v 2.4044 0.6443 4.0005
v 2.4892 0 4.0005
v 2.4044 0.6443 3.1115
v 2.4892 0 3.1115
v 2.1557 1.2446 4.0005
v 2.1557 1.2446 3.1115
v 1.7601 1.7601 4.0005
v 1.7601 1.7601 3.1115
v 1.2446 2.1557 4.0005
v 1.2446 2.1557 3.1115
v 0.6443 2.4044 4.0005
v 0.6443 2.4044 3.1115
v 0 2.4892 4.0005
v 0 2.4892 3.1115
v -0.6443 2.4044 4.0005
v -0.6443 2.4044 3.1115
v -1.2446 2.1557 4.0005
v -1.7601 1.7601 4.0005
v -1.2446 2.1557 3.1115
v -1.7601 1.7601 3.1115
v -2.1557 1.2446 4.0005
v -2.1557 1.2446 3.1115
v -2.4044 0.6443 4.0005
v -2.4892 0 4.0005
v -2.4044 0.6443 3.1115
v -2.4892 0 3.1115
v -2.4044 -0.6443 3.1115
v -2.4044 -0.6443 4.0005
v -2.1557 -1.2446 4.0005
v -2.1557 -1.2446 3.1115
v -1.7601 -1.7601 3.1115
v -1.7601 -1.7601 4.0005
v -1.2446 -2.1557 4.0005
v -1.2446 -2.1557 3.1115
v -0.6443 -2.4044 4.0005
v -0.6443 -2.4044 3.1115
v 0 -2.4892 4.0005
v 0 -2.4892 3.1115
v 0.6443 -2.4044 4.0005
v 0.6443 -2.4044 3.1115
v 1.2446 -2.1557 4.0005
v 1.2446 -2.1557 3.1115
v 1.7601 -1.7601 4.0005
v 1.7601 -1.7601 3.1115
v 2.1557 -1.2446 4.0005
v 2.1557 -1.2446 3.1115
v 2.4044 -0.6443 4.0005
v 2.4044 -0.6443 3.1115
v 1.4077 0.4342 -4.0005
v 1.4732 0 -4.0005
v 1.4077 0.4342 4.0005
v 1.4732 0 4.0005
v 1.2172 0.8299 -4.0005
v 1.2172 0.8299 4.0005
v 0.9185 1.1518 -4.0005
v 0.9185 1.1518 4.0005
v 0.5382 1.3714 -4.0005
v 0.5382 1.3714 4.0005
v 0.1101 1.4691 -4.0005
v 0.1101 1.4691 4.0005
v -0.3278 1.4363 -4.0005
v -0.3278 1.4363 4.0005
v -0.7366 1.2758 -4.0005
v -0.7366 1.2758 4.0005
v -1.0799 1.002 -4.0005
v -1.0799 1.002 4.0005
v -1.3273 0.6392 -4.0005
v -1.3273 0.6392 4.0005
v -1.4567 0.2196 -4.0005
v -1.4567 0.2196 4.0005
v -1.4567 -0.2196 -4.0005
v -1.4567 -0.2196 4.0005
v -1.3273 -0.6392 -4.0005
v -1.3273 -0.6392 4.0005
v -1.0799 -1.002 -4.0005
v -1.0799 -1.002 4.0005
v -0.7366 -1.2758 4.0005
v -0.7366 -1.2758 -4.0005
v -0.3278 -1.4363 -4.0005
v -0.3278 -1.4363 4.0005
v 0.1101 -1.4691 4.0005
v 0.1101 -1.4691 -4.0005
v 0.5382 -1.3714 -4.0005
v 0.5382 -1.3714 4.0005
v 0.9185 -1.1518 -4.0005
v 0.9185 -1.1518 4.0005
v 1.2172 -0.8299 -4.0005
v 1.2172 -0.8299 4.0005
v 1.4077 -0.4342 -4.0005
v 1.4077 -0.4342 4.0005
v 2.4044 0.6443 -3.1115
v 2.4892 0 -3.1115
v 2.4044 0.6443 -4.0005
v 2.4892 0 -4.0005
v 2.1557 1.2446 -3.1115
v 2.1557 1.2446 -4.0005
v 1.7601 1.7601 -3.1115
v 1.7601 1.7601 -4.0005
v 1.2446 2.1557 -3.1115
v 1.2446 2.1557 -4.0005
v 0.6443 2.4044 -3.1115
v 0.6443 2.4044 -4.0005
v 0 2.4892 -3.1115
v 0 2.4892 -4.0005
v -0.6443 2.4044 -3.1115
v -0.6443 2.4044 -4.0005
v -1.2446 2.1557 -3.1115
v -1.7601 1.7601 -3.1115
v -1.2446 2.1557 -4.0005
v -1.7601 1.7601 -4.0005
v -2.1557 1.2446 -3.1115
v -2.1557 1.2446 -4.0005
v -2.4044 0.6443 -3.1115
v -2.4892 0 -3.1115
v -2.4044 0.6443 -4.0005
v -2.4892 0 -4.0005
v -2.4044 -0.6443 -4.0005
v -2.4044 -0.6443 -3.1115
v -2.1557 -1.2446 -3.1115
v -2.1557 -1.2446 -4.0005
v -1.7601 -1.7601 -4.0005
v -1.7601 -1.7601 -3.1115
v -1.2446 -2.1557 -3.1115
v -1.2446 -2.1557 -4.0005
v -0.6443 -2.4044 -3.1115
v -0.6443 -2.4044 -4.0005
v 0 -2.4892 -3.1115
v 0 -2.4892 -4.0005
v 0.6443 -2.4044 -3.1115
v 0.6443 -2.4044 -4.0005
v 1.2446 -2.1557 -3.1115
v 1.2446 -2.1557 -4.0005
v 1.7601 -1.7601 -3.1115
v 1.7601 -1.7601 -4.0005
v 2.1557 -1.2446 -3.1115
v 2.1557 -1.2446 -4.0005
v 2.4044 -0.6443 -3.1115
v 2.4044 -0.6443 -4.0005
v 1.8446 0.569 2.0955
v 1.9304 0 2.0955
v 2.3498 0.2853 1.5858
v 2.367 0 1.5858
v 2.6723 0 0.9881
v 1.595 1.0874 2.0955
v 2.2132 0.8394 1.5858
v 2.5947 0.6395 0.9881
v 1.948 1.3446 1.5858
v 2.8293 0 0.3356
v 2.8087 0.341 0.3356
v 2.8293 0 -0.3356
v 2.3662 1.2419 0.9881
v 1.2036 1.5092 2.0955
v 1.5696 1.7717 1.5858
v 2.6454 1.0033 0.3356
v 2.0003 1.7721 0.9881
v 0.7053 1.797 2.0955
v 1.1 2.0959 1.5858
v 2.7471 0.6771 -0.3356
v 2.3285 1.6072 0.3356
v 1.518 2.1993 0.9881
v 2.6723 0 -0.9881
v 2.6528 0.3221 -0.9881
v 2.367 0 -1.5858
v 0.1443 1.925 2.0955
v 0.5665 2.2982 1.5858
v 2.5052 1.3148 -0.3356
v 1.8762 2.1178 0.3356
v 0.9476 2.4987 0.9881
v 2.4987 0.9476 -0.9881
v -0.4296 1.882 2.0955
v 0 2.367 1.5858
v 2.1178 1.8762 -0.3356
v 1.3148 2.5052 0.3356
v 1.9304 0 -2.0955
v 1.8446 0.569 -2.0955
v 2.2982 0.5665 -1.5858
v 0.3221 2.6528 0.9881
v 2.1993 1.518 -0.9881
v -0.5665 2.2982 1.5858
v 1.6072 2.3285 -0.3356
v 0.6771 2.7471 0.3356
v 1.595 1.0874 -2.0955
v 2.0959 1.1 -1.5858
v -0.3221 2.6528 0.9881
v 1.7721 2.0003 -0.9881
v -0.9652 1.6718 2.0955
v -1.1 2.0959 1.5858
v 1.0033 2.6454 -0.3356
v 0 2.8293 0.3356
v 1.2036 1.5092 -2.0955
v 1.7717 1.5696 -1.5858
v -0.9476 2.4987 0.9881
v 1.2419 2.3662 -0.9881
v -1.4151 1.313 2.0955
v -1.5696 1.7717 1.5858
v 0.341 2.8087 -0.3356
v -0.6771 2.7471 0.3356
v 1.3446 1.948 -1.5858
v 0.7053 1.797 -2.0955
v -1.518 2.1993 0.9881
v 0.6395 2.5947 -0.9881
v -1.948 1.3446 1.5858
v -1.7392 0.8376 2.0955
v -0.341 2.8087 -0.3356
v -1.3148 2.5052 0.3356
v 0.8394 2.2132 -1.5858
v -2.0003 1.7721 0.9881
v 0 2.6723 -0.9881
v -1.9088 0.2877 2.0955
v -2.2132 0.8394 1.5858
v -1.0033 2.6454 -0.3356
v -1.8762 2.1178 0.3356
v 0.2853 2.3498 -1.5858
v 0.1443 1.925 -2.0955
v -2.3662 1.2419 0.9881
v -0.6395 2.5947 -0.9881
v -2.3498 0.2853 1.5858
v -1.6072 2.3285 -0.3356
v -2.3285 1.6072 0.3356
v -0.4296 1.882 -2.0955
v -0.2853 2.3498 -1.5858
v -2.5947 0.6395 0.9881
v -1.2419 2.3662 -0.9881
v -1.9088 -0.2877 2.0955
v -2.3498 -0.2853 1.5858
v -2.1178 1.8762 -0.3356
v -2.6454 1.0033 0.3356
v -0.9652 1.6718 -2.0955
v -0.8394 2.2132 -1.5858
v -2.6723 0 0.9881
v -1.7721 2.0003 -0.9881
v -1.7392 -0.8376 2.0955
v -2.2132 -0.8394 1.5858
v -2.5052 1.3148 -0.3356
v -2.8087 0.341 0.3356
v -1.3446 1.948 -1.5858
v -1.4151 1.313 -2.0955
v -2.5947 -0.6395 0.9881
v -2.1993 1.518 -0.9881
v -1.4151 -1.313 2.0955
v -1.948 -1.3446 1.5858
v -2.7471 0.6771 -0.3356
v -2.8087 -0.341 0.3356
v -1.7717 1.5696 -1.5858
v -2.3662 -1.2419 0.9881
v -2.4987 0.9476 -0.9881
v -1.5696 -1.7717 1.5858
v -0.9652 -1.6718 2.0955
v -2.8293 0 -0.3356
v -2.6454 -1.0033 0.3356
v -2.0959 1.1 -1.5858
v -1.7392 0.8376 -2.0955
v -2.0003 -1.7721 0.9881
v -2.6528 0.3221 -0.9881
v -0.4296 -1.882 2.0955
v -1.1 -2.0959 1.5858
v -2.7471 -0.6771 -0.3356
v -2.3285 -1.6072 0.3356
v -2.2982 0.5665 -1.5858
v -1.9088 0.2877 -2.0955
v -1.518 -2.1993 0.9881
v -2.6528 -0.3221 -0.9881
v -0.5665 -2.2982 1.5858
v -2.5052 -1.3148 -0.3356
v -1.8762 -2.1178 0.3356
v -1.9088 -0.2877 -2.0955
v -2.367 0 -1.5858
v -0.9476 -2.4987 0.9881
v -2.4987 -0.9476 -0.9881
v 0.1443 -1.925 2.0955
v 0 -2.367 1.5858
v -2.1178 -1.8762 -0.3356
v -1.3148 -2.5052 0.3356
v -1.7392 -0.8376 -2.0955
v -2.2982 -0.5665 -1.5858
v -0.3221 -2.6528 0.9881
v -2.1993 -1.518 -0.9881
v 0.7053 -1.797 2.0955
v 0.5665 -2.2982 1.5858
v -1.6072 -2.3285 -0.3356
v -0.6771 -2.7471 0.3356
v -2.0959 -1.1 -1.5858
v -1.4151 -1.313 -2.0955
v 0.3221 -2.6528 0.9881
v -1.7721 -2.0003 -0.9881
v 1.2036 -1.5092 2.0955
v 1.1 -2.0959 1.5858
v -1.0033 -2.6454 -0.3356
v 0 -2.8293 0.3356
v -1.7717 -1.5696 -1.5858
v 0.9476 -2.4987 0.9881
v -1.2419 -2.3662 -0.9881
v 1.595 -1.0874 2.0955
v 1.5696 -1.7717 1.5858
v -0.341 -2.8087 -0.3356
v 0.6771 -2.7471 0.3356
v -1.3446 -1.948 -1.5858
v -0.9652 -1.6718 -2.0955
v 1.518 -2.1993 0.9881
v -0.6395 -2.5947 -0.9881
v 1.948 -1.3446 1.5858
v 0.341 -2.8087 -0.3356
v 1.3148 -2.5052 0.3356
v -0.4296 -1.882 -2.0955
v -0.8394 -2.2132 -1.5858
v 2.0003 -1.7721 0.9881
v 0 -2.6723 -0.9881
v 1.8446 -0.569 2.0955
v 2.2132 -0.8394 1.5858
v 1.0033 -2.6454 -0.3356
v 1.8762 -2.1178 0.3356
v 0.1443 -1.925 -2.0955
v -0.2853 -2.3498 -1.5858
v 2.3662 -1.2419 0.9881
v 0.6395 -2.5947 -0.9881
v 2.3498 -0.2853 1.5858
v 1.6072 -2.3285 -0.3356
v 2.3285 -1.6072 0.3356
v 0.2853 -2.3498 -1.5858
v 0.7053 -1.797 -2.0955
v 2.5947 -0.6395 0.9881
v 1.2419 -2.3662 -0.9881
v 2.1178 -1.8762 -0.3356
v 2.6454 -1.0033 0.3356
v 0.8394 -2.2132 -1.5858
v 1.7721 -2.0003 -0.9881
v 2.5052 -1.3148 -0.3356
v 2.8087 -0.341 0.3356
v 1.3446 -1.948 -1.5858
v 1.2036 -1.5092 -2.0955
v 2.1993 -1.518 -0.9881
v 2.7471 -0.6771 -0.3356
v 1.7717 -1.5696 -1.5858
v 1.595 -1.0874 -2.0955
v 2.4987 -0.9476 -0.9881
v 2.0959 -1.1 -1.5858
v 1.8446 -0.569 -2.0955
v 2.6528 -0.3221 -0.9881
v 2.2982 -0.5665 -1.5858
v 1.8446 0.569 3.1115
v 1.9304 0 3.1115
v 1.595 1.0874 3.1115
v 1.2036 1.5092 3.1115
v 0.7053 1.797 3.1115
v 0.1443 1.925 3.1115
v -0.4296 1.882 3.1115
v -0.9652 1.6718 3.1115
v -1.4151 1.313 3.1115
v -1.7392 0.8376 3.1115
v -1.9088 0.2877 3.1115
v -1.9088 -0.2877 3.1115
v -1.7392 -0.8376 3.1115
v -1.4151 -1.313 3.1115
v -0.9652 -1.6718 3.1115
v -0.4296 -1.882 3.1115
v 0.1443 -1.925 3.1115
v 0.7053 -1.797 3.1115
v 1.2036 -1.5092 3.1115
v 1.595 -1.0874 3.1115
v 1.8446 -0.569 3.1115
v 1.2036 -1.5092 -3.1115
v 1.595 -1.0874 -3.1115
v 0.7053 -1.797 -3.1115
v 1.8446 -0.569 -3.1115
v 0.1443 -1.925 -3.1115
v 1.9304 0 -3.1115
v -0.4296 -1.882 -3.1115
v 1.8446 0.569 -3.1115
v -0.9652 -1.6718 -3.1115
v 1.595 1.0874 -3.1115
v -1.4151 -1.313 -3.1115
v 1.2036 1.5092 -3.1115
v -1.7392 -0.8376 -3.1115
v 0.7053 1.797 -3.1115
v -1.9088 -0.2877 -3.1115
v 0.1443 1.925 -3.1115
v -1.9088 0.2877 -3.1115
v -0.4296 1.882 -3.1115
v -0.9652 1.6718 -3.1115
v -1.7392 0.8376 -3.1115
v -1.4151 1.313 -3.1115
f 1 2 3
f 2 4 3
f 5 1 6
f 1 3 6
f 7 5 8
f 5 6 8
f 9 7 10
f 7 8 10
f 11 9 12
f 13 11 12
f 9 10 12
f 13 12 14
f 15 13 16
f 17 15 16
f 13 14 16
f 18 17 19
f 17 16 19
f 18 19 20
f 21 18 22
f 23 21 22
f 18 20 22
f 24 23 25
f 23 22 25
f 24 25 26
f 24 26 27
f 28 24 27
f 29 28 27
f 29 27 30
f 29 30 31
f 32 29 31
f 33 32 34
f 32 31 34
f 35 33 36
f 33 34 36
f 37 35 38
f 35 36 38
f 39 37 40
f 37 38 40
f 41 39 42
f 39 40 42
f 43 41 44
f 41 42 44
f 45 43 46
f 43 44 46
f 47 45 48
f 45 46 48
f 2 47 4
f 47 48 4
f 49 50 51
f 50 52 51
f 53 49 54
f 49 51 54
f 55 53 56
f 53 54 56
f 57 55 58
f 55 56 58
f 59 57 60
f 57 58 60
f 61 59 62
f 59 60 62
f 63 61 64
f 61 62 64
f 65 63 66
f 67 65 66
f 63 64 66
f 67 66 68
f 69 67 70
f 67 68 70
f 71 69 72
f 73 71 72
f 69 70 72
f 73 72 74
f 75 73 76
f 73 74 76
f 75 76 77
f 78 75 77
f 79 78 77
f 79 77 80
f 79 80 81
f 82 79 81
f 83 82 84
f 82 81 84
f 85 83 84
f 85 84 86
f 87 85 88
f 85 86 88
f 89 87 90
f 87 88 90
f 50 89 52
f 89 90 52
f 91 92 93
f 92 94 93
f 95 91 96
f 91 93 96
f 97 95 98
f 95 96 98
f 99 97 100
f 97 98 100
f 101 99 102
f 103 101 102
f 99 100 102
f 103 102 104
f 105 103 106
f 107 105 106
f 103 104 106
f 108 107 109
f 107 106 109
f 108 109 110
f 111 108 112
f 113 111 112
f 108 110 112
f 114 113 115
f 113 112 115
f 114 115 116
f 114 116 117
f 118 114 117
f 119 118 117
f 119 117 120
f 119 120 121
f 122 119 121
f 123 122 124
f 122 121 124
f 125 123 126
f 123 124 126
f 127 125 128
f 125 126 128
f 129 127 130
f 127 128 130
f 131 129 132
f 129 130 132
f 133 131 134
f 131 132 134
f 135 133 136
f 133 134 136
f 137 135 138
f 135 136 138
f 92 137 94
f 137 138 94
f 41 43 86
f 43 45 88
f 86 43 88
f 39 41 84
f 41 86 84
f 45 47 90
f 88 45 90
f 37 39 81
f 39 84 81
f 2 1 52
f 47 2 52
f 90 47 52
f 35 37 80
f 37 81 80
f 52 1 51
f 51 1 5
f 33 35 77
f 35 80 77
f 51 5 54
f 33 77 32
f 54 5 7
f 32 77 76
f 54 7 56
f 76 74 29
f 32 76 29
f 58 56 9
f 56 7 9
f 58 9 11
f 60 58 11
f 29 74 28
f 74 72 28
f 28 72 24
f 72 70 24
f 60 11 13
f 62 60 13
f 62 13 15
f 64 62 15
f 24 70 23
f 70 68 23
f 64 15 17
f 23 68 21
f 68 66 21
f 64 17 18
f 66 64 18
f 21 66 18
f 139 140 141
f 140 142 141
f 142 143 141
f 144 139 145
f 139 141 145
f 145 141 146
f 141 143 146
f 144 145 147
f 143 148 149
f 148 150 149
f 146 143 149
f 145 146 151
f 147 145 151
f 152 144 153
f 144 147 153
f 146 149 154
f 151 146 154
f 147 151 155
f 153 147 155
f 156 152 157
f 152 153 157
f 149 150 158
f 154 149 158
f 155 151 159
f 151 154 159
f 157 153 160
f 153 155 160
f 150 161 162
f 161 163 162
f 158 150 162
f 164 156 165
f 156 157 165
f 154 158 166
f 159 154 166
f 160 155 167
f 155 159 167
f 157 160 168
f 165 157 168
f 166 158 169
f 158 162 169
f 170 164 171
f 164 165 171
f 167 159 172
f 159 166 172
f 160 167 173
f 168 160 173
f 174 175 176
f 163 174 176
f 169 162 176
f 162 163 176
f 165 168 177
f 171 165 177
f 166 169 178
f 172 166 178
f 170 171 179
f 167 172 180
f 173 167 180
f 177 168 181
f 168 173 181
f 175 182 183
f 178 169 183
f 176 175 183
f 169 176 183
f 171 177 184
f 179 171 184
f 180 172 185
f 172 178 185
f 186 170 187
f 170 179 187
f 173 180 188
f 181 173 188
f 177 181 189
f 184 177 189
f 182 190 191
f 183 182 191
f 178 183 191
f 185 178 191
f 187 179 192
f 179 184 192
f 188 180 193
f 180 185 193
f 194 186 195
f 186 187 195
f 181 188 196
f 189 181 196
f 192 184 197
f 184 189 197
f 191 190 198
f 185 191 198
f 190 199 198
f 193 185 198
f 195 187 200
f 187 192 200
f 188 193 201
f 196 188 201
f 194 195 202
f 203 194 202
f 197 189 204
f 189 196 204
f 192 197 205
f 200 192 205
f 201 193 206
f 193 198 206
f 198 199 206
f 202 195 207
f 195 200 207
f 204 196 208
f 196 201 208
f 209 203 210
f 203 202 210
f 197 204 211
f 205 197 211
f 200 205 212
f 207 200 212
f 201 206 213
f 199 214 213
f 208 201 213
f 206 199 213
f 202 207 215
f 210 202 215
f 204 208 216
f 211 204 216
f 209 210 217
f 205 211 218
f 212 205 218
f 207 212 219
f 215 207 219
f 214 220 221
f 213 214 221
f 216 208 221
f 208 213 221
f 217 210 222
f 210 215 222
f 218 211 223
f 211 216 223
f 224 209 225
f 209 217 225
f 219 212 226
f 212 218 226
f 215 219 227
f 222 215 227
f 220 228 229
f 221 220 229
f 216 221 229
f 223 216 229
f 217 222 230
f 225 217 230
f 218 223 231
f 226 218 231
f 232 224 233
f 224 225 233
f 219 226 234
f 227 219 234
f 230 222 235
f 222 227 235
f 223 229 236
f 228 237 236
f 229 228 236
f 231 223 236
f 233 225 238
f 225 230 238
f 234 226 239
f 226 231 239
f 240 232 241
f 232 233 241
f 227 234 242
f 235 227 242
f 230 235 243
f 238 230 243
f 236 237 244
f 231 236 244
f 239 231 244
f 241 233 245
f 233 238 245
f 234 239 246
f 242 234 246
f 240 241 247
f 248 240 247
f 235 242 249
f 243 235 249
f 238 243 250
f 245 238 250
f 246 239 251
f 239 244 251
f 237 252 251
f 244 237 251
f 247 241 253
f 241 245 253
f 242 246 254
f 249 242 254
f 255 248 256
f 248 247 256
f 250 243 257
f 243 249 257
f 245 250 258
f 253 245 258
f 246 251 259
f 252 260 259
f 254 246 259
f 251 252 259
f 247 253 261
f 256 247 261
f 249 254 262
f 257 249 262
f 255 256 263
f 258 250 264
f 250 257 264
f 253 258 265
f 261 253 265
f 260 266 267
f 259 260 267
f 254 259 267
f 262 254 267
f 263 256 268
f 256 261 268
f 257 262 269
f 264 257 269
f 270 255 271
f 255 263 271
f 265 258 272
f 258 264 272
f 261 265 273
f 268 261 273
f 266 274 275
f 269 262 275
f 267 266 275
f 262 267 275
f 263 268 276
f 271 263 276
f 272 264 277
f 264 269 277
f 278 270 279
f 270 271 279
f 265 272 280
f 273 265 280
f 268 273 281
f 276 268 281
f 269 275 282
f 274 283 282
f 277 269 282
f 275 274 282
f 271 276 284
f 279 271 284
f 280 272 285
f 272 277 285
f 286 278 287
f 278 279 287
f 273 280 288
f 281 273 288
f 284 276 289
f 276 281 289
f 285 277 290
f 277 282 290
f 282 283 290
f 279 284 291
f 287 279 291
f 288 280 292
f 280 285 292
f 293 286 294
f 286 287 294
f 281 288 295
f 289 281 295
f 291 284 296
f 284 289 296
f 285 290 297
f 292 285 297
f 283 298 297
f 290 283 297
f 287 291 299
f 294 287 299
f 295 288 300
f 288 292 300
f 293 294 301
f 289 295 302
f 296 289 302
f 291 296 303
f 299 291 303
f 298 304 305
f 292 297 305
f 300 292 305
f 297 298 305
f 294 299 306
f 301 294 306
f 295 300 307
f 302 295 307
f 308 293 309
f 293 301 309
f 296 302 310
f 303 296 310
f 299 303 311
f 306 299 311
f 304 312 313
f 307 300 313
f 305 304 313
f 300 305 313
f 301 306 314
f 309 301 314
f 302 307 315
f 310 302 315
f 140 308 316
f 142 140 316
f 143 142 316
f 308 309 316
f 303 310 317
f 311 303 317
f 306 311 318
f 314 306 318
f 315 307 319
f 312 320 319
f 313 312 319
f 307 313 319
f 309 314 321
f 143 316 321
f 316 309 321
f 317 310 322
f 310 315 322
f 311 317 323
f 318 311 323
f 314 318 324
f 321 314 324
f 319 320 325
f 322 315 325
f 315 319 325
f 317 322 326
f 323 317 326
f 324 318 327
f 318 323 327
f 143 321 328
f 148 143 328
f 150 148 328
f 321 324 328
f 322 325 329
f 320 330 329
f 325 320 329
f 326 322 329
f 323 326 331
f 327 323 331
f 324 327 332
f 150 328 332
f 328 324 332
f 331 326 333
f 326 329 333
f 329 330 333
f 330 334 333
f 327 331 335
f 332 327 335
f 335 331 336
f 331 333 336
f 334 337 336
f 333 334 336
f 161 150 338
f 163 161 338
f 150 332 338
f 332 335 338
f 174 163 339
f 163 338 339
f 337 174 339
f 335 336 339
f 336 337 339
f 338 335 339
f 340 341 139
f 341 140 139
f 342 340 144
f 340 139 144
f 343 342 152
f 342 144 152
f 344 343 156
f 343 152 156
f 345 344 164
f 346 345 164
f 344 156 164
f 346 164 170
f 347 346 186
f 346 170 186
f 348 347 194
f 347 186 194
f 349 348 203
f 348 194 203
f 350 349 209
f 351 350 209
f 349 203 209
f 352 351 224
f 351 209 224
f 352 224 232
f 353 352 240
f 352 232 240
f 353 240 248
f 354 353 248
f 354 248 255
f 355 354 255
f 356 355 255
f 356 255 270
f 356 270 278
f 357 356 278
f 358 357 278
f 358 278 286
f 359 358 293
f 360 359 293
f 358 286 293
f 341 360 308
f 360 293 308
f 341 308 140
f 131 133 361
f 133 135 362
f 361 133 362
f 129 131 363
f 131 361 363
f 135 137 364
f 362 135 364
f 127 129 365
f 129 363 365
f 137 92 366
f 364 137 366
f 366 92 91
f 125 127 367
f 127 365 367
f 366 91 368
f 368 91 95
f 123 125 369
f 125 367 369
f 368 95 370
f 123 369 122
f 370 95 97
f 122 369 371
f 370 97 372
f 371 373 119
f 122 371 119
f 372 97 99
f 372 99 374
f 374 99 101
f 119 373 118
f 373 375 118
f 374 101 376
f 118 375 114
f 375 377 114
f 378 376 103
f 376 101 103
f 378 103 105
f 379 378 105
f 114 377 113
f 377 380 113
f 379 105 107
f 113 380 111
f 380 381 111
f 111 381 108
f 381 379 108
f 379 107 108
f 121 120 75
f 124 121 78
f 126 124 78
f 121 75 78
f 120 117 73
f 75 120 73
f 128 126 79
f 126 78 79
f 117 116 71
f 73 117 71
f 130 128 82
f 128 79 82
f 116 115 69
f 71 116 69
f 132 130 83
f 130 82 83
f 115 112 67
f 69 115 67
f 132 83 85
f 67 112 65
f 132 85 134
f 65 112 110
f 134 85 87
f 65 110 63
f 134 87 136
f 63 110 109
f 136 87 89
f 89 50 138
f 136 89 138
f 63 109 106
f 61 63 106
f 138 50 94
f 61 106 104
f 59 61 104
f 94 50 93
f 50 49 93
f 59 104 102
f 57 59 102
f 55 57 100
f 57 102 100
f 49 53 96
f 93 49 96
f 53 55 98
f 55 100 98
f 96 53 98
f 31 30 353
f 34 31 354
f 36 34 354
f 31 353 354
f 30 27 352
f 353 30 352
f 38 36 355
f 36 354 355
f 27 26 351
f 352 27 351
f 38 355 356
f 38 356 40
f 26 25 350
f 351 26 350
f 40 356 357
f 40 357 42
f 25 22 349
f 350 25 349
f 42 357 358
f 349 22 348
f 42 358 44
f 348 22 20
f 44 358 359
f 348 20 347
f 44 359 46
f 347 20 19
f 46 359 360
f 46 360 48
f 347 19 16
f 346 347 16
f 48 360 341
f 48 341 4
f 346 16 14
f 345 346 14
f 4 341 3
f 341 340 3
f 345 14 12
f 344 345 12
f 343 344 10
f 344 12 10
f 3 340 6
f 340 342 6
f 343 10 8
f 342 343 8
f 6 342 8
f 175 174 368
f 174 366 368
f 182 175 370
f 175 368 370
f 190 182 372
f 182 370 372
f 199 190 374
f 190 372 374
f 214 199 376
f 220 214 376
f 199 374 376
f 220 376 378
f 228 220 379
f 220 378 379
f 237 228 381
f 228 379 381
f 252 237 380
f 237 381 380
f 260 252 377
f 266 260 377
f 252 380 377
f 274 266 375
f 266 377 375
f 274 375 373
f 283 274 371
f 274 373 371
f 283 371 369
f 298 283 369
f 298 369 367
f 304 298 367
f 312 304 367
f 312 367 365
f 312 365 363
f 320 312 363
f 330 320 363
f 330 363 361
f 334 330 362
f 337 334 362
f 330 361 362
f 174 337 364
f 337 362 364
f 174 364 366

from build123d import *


with BuildPart() as part:
    # Sketch1 → Revolve1 (revolve)
    with BuildSketch(Plane(origin=(0, 0, 0), x_dir=(1, 0, 0), z_dir=(0, 1, 0))):
        with BuildLine():
            Line((1.4732, 4.0005), (1.4732, -4.0005))
            Line((1.4732, -4.0005), (2.4892, -4.0005))
            Line((2.4892, -4.0005), (2.4892, -3.1115))
            Line((2.4892, -3.1115), (1.9304, -3.1115))
            Line((1.9304, -3.1115), (1.9304, -2.0955))
            ThreePointArc((1.9304, -2.0955), (2.849133975, 0), (1.9304, 2.0955))
            Line((1.9304, 2.0955), (1.9304, 3.1115))
            Line((1.9304, 3.1115), (2.4892, 3.1115))
            Line((2.4892, 3.1115), (2.4892, 4.0005))
            Line((2.4892, 4.0005), (1.4732, 4.0005))
        make_face()
    revolve(axis=Axis((0, 0, -2.773013621), (0, 0, 1)))


solid = part.part
